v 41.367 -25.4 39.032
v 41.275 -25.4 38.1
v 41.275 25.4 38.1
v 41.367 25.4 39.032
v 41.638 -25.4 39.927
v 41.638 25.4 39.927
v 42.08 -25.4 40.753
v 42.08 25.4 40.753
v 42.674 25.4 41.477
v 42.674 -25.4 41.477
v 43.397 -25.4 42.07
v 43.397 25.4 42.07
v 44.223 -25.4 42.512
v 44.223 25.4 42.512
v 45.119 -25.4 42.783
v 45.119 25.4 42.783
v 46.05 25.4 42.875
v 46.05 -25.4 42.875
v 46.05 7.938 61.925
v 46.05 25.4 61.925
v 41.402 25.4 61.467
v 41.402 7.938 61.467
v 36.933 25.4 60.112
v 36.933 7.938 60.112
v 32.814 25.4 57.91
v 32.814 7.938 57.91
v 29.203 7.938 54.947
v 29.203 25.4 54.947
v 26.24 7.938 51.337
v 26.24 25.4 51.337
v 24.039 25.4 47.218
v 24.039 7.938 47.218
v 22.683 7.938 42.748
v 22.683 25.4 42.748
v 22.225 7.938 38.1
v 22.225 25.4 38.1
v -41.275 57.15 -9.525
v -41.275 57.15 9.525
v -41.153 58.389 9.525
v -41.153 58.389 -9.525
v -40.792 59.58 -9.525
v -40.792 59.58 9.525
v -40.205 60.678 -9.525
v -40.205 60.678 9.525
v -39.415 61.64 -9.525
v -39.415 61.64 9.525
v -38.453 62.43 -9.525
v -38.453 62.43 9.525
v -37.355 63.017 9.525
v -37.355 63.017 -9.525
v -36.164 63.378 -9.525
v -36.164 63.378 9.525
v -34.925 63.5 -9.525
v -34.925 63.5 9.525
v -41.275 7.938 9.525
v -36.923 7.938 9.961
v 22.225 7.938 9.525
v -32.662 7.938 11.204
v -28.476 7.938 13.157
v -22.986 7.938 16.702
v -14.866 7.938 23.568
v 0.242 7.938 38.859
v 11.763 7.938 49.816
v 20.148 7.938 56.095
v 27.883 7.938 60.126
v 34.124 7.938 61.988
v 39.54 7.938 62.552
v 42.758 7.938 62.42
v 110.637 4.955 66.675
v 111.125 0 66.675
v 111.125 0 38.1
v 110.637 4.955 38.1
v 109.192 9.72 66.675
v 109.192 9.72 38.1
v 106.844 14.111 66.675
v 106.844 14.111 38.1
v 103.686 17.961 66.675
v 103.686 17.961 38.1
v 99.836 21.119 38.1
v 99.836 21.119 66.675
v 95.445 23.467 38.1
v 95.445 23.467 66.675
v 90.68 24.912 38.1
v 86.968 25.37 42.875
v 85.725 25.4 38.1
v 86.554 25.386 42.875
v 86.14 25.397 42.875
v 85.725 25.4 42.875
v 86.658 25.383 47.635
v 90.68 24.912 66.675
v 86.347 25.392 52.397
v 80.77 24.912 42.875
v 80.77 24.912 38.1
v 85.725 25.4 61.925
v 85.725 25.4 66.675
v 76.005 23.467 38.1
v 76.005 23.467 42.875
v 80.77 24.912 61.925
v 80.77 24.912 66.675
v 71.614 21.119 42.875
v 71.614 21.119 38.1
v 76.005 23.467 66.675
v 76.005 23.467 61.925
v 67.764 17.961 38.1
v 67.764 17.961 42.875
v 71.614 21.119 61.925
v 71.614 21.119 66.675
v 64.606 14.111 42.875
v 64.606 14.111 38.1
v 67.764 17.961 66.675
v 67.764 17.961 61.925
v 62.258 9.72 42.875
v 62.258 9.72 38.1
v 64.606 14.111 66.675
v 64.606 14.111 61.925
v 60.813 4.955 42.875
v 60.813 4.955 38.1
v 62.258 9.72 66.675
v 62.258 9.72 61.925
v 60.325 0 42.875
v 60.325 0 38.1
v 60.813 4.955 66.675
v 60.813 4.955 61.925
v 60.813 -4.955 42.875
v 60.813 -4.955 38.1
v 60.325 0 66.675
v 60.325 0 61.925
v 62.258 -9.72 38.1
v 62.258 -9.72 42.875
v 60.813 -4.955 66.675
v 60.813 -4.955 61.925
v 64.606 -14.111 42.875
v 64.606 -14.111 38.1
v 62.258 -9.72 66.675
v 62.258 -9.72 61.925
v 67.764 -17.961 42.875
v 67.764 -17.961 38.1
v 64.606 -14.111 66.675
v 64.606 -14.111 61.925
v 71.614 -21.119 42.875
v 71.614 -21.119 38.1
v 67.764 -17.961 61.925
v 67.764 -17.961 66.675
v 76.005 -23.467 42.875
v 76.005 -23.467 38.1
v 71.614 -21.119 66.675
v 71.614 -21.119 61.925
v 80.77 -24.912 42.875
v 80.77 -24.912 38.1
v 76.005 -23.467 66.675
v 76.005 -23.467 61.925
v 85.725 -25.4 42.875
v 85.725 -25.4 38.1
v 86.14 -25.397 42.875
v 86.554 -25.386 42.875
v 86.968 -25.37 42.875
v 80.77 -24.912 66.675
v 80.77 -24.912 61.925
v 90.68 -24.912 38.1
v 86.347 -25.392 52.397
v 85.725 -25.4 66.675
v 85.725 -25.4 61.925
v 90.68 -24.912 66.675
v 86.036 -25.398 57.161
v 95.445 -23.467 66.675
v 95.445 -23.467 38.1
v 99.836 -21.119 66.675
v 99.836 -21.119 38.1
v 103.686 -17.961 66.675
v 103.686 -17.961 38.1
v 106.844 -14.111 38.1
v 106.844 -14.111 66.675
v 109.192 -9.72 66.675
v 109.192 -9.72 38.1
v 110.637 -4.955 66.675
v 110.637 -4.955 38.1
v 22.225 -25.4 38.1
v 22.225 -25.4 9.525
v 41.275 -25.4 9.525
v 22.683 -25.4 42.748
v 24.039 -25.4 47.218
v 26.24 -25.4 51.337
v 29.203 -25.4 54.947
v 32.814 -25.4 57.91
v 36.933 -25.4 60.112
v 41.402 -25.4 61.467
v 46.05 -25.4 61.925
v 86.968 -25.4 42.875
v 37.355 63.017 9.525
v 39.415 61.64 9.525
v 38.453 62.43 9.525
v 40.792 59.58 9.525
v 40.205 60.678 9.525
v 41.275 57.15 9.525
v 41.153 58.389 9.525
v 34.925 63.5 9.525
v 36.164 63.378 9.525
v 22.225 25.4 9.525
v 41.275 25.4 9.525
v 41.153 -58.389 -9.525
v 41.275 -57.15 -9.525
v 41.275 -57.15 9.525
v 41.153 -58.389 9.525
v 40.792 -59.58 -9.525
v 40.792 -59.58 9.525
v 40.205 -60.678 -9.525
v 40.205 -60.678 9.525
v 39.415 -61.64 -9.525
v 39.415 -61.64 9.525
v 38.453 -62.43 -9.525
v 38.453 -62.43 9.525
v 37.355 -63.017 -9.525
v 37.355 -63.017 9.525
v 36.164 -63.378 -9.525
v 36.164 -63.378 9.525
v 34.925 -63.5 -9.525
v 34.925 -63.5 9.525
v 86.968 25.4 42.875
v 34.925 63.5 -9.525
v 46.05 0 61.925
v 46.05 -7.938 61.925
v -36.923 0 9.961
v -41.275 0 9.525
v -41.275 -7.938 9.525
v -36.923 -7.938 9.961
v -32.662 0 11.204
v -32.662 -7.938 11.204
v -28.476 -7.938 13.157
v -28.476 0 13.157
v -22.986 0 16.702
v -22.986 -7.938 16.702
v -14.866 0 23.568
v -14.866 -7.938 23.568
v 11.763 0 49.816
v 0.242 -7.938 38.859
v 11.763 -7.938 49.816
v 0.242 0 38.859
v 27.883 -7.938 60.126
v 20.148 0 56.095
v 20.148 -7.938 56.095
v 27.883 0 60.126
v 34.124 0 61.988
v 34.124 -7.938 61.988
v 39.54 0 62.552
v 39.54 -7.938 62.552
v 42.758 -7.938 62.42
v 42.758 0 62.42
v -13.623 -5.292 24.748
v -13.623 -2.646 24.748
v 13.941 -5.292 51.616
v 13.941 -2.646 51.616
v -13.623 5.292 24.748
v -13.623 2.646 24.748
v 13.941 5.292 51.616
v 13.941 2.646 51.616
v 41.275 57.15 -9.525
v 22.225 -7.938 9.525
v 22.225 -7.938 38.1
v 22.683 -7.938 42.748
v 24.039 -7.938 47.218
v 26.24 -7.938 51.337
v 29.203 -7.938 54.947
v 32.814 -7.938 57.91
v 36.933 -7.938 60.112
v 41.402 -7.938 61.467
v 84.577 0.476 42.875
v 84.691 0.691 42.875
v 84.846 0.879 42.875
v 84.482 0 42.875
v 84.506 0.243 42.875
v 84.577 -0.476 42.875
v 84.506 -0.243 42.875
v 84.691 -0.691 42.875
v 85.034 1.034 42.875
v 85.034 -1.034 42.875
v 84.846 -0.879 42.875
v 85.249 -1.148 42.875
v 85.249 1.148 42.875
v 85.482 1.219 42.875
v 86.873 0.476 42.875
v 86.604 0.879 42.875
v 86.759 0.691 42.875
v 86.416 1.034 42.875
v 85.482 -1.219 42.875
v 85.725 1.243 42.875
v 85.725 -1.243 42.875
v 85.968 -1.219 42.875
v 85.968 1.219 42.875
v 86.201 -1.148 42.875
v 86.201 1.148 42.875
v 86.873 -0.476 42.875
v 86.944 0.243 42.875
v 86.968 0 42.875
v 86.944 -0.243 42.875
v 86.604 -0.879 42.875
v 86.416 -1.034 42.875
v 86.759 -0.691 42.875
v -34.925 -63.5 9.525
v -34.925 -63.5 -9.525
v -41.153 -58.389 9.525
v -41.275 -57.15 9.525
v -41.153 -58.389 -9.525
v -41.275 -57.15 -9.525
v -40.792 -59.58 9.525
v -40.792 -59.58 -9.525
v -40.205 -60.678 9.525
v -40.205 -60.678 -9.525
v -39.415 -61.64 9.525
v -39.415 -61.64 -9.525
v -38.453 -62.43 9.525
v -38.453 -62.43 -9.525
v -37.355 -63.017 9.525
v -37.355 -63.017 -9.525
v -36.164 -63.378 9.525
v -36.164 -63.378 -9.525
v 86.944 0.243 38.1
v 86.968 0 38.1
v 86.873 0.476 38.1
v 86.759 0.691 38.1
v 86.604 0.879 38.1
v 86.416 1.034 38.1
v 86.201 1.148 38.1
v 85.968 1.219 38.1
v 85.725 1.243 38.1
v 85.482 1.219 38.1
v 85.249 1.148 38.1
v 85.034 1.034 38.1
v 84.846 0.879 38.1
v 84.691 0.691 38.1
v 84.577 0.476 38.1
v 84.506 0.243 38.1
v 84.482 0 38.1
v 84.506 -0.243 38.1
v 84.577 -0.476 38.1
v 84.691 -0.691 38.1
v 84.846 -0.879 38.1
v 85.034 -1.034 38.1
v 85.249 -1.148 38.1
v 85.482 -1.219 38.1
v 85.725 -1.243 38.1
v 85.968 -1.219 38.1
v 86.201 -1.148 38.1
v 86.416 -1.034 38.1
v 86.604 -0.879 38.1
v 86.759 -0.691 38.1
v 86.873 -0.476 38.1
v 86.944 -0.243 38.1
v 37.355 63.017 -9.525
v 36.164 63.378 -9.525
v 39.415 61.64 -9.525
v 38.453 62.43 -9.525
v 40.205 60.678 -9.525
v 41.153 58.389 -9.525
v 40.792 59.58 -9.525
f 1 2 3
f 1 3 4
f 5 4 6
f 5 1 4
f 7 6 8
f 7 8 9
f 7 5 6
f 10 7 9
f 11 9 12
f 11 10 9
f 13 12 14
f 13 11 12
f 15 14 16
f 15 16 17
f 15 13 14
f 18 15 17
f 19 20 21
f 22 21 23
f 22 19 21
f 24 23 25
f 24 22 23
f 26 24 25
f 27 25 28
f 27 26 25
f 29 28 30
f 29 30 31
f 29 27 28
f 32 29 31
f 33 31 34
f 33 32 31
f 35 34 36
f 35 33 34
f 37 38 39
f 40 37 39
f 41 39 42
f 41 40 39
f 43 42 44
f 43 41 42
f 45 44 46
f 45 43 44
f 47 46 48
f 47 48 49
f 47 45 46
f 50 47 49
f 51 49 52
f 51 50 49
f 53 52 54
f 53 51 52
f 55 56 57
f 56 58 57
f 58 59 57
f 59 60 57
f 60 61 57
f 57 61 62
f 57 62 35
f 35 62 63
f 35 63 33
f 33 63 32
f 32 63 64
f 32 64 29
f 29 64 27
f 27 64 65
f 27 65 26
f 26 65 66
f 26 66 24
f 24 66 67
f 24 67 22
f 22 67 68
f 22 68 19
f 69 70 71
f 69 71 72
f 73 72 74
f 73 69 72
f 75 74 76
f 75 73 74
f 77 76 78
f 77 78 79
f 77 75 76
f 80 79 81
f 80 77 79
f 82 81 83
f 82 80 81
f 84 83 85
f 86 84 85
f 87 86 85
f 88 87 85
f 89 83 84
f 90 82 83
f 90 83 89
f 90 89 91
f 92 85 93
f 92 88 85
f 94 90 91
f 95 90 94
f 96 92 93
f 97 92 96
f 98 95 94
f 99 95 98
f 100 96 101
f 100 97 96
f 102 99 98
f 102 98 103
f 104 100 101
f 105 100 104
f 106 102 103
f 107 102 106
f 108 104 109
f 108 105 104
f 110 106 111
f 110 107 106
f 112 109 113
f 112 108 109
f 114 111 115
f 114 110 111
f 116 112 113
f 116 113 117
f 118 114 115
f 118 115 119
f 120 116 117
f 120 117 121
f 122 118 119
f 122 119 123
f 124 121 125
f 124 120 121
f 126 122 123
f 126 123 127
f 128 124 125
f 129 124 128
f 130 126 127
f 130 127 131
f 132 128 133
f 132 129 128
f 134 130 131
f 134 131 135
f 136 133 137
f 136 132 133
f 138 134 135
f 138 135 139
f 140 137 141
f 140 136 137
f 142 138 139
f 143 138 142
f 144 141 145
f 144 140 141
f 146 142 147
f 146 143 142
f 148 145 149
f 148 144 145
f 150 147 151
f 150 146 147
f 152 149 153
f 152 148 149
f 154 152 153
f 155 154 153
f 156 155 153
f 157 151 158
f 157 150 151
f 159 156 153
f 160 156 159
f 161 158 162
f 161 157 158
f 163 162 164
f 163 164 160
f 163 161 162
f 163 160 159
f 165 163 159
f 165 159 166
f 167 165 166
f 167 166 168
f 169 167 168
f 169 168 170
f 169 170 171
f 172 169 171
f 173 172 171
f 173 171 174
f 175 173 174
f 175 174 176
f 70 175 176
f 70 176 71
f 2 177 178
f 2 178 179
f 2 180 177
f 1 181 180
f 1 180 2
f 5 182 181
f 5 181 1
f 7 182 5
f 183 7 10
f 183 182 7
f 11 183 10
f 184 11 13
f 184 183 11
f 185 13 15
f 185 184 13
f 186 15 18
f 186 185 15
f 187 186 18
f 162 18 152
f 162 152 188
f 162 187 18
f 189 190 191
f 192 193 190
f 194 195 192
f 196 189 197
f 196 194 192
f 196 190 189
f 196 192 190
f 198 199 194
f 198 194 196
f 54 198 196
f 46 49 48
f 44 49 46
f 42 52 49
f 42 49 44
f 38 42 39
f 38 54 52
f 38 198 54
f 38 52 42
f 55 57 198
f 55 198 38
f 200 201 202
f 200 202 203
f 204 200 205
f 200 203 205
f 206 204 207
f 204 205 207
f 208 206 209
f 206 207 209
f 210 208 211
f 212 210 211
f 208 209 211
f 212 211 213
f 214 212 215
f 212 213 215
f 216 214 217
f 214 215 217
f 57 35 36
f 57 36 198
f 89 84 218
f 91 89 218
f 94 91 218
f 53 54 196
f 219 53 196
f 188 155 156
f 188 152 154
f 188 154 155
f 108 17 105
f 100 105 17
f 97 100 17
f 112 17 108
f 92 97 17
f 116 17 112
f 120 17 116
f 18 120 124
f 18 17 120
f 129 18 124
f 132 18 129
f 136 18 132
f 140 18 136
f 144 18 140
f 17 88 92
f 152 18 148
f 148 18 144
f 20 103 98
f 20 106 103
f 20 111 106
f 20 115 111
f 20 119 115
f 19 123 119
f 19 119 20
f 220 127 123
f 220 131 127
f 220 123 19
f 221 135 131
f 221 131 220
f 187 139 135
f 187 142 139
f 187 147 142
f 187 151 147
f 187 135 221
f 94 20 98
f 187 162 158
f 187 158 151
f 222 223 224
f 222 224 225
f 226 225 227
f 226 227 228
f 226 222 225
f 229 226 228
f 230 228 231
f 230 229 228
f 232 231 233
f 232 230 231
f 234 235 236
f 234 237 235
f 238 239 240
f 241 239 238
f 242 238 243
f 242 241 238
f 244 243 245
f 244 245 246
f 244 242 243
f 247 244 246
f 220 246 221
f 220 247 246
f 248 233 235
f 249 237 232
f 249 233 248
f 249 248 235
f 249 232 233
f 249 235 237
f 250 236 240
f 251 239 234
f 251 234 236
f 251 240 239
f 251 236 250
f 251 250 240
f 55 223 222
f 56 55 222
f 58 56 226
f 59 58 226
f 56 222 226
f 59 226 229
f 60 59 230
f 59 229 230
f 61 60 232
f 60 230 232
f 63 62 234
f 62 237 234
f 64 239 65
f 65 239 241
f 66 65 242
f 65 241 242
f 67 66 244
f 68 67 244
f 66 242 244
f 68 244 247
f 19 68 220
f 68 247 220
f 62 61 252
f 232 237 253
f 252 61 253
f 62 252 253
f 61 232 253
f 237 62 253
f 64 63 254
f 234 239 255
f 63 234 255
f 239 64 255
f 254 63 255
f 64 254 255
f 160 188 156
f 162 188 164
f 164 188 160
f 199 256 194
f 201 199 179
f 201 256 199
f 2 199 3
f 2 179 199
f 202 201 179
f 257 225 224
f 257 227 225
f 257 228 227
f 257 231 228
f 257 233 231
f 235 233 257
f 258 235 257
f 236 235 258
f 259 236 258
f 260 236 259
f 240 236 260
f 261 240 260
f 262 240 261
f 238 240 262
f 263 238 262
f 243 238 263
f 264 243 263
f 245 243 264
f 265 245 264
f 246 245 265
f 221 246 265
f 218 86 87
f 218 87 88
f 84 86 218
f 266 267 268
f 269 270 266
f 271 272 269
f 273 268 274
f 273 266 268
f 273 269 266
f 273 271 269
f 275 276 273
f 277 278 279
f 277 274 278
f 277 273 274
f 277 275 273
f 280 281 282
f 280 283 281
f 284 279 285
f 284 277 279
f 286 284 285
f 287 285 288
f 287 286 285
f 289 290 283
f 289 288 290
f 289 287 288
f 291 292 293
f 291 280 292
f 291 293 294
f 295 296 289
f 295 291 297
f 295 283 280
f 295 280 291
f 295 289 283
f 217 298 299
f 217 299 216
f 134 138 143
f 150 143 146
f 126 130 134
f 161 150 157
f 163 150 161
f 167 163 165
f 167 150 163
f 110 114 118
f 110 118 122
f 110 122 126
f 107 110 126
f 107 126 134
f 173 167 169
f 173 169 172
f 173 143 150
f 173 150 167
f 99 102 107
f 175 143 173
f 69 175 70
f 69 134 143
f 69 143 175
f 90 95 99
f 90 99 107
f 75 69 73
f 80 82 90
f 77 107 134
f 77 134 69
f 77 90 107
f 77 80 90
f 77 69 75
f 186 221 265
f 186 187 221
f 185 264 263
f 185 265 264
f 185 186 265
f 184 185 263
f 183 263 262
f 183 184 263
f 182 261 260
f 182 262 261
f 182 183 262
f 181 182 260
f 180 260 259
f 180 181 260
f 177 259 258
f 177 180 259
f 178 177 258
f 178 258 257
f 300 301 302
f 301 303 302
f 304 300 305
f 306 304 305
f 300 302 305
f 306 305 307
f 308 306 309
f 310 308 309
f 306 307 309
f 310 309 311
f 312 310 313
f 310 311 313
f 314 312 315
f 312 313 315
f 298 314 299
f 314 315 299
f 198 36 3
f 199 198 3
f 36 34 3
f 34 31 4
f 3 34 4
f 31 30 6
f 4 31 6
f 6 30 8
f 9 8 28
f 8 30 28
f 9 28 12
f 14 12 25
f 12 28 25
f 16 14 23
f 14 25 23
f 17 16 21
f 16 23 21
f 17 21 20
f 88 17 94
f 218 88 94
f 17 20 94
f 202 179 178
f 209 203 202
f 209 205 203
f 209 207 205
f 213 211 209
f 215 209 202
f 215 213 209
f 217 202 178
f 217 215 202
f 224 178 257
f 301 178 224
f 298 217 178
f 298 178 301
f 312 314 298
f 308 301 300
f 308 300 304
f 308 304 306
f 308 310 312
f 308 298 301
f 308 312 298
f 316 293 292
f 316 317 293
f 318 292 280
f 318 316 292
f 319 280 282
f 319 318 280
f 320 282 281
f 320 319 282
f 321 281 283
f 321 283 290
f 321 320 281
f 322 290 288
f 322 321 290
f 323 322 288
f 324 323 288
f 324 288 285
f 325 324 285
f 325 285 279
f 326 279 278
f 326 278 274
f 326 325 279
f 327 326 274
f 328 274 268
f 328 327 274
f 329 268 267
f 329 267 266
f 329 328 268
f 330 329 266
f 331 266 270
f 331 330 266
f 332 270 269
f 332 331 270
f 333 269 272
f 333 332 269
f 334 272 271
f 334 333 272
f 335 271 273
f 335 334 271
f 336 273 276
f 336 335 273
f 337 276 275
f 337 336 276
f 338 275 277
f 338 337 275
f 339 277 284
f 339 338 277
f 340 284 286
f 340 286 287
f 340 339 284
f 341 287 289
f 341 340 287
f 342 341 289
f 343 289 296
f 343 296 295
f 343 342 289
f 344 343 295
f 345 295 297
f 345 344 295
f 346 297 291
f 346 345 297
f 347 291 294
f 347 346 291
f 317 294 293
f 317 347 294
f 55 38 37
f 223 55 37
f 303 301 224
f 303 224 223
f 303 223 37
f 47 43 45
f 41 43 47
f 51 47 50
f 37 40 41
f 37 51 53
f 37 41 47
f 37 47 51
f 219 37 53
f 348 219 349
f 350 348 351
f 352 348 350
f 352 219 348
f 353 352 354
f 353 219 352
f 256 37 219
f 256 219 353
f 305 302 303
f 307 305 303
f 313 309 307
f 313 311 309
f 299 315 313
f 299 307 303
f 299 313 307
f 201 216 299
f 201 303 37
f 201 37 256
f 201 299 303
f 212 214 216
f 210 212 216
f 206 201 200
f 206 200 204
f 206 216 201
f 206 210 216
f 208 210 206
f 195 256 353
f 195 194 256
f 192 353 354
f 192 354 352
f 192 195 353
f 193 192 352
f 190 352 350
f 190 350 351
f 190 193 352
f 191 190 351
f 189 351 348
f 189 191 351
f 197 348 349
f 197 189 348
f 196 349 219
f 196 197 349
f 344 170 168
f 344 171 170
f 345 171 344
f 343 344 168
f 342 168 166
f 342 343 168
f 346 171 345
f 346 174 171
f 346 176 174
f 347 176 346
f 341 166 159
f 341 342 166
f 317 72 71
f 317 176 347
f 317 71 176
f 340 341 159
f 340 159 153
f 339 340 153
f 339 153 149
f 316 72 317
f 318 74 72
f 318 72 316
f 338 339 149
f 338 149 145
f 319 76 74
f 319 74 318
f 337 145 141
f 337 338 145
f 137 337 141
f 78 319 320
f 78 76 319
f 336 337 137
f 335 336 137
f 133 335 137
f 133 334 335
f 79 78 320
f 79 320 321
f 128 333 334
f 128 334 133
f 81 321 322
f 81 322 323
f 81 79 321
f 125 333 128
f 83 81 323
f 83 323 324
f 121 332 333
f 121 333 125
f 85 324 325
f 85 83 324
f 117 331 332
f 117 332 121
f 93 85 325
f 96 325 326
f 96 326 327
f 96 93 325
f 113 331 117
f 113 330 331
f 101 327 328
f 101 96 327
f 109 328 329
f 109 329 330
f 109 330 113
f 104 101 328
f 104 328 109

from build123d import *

# Parameters (mm, degrees)
F1_DEPTH = 63.5
F2_DEPTH = 25.4
F3_DEPTH = 7.9375
F5_R     = 6.35


with BuildPart() as f1:
    # F0 (on Front) → F1 (new body, symmetric)
    with BuildSketch(Plane.XZ):
        Polygon((41.275, -9.525), (41.275, 9.525), (22.225, 9.525), (-41.275, 9.525), (-41.275, -9.525), align=None)
    extrude(amount=F1_DEPTH, both=True)

    # F0 (on Front) → F2 (join, symmetric)
    with BuildSketch(Plane.XZ):
        with BuildLine():
            Line((22.225, 9.525), (41.275, 9.525))
            Line((41.275, 9.525), (41.275, 38.1))
            ThreePointArc((41.275, 38.1), (42.673624, 41.476576), (46.0502, 42.8752))
            Line((46.0502, 42.8752), (60.325, 42.8752))
            Line((60.325, 42.8752), (60.325, 61.9252))
            Line((60.325, 61.9252), (46.0502, 61.9252))
            ThreePointArc((46.0502, 61.9252), (29.20324, 54.94696), (22.225, 38.1))
            Line((22.225, 38.1), (22.225, 9.525))
        make_face()
        Polygon((60.325, 61.9252), (60.325, 42.8752), (76.285926, 42.8752), (86.96812, 42.8752), (85.725, 61.9252), align=None)
    extrude(amount=F2_DEPTH, both=True)

    # F0 (on Front) → F3 (join, symmetric)
    with BuildSketch(Plane.XZ):
        with BuildLine():
            Line((-41.275, 9.525), (22.225, 9.525))
            Line((22.225, 9.525), (22.225, 38.1))
            ThreePointArc((22.225, 38.1), (29.20324, 54.94696), (46.0502, 61.9252))
            add(Edge.make_bspline(
                [(-41.275, 9.525), (-12.033702, 9.525), (10.122908, 69.295764), (46.0502, 61.9252)],
                knots=[0, 0, 0, 0, 101.840422, 101.840422, 101.840422, 101.840422], degree=3))
        make_face()
    extrude(amount=F3_DEPTH, both=True)

    # F0 (on Front) → F4 (revolve)
    with BuildSketch(Plane.XZ):
        Polygon((85.725, 66.675), (85.725, 61.9252), (86.96812, 42.8752), (86.96812, 38.1), (111.125, 38.1), (111.125, 66.675), align=None)
    revolve(axis=Axis((85.725, 0, 64.3001), (0, 0, 1)))

    # F5
    f5_edges = [f1.edges().sort_by_distance(p)[0] for p in [
        (-41.275, -63.5, 0),
        (41.275, -63.5, 0),
        (41.275, 63.5, 0),
        (-41.275, 63.5, 0),
    ]]
    fillet(f5_edges, radius=F5_R)


solid = f1.part
